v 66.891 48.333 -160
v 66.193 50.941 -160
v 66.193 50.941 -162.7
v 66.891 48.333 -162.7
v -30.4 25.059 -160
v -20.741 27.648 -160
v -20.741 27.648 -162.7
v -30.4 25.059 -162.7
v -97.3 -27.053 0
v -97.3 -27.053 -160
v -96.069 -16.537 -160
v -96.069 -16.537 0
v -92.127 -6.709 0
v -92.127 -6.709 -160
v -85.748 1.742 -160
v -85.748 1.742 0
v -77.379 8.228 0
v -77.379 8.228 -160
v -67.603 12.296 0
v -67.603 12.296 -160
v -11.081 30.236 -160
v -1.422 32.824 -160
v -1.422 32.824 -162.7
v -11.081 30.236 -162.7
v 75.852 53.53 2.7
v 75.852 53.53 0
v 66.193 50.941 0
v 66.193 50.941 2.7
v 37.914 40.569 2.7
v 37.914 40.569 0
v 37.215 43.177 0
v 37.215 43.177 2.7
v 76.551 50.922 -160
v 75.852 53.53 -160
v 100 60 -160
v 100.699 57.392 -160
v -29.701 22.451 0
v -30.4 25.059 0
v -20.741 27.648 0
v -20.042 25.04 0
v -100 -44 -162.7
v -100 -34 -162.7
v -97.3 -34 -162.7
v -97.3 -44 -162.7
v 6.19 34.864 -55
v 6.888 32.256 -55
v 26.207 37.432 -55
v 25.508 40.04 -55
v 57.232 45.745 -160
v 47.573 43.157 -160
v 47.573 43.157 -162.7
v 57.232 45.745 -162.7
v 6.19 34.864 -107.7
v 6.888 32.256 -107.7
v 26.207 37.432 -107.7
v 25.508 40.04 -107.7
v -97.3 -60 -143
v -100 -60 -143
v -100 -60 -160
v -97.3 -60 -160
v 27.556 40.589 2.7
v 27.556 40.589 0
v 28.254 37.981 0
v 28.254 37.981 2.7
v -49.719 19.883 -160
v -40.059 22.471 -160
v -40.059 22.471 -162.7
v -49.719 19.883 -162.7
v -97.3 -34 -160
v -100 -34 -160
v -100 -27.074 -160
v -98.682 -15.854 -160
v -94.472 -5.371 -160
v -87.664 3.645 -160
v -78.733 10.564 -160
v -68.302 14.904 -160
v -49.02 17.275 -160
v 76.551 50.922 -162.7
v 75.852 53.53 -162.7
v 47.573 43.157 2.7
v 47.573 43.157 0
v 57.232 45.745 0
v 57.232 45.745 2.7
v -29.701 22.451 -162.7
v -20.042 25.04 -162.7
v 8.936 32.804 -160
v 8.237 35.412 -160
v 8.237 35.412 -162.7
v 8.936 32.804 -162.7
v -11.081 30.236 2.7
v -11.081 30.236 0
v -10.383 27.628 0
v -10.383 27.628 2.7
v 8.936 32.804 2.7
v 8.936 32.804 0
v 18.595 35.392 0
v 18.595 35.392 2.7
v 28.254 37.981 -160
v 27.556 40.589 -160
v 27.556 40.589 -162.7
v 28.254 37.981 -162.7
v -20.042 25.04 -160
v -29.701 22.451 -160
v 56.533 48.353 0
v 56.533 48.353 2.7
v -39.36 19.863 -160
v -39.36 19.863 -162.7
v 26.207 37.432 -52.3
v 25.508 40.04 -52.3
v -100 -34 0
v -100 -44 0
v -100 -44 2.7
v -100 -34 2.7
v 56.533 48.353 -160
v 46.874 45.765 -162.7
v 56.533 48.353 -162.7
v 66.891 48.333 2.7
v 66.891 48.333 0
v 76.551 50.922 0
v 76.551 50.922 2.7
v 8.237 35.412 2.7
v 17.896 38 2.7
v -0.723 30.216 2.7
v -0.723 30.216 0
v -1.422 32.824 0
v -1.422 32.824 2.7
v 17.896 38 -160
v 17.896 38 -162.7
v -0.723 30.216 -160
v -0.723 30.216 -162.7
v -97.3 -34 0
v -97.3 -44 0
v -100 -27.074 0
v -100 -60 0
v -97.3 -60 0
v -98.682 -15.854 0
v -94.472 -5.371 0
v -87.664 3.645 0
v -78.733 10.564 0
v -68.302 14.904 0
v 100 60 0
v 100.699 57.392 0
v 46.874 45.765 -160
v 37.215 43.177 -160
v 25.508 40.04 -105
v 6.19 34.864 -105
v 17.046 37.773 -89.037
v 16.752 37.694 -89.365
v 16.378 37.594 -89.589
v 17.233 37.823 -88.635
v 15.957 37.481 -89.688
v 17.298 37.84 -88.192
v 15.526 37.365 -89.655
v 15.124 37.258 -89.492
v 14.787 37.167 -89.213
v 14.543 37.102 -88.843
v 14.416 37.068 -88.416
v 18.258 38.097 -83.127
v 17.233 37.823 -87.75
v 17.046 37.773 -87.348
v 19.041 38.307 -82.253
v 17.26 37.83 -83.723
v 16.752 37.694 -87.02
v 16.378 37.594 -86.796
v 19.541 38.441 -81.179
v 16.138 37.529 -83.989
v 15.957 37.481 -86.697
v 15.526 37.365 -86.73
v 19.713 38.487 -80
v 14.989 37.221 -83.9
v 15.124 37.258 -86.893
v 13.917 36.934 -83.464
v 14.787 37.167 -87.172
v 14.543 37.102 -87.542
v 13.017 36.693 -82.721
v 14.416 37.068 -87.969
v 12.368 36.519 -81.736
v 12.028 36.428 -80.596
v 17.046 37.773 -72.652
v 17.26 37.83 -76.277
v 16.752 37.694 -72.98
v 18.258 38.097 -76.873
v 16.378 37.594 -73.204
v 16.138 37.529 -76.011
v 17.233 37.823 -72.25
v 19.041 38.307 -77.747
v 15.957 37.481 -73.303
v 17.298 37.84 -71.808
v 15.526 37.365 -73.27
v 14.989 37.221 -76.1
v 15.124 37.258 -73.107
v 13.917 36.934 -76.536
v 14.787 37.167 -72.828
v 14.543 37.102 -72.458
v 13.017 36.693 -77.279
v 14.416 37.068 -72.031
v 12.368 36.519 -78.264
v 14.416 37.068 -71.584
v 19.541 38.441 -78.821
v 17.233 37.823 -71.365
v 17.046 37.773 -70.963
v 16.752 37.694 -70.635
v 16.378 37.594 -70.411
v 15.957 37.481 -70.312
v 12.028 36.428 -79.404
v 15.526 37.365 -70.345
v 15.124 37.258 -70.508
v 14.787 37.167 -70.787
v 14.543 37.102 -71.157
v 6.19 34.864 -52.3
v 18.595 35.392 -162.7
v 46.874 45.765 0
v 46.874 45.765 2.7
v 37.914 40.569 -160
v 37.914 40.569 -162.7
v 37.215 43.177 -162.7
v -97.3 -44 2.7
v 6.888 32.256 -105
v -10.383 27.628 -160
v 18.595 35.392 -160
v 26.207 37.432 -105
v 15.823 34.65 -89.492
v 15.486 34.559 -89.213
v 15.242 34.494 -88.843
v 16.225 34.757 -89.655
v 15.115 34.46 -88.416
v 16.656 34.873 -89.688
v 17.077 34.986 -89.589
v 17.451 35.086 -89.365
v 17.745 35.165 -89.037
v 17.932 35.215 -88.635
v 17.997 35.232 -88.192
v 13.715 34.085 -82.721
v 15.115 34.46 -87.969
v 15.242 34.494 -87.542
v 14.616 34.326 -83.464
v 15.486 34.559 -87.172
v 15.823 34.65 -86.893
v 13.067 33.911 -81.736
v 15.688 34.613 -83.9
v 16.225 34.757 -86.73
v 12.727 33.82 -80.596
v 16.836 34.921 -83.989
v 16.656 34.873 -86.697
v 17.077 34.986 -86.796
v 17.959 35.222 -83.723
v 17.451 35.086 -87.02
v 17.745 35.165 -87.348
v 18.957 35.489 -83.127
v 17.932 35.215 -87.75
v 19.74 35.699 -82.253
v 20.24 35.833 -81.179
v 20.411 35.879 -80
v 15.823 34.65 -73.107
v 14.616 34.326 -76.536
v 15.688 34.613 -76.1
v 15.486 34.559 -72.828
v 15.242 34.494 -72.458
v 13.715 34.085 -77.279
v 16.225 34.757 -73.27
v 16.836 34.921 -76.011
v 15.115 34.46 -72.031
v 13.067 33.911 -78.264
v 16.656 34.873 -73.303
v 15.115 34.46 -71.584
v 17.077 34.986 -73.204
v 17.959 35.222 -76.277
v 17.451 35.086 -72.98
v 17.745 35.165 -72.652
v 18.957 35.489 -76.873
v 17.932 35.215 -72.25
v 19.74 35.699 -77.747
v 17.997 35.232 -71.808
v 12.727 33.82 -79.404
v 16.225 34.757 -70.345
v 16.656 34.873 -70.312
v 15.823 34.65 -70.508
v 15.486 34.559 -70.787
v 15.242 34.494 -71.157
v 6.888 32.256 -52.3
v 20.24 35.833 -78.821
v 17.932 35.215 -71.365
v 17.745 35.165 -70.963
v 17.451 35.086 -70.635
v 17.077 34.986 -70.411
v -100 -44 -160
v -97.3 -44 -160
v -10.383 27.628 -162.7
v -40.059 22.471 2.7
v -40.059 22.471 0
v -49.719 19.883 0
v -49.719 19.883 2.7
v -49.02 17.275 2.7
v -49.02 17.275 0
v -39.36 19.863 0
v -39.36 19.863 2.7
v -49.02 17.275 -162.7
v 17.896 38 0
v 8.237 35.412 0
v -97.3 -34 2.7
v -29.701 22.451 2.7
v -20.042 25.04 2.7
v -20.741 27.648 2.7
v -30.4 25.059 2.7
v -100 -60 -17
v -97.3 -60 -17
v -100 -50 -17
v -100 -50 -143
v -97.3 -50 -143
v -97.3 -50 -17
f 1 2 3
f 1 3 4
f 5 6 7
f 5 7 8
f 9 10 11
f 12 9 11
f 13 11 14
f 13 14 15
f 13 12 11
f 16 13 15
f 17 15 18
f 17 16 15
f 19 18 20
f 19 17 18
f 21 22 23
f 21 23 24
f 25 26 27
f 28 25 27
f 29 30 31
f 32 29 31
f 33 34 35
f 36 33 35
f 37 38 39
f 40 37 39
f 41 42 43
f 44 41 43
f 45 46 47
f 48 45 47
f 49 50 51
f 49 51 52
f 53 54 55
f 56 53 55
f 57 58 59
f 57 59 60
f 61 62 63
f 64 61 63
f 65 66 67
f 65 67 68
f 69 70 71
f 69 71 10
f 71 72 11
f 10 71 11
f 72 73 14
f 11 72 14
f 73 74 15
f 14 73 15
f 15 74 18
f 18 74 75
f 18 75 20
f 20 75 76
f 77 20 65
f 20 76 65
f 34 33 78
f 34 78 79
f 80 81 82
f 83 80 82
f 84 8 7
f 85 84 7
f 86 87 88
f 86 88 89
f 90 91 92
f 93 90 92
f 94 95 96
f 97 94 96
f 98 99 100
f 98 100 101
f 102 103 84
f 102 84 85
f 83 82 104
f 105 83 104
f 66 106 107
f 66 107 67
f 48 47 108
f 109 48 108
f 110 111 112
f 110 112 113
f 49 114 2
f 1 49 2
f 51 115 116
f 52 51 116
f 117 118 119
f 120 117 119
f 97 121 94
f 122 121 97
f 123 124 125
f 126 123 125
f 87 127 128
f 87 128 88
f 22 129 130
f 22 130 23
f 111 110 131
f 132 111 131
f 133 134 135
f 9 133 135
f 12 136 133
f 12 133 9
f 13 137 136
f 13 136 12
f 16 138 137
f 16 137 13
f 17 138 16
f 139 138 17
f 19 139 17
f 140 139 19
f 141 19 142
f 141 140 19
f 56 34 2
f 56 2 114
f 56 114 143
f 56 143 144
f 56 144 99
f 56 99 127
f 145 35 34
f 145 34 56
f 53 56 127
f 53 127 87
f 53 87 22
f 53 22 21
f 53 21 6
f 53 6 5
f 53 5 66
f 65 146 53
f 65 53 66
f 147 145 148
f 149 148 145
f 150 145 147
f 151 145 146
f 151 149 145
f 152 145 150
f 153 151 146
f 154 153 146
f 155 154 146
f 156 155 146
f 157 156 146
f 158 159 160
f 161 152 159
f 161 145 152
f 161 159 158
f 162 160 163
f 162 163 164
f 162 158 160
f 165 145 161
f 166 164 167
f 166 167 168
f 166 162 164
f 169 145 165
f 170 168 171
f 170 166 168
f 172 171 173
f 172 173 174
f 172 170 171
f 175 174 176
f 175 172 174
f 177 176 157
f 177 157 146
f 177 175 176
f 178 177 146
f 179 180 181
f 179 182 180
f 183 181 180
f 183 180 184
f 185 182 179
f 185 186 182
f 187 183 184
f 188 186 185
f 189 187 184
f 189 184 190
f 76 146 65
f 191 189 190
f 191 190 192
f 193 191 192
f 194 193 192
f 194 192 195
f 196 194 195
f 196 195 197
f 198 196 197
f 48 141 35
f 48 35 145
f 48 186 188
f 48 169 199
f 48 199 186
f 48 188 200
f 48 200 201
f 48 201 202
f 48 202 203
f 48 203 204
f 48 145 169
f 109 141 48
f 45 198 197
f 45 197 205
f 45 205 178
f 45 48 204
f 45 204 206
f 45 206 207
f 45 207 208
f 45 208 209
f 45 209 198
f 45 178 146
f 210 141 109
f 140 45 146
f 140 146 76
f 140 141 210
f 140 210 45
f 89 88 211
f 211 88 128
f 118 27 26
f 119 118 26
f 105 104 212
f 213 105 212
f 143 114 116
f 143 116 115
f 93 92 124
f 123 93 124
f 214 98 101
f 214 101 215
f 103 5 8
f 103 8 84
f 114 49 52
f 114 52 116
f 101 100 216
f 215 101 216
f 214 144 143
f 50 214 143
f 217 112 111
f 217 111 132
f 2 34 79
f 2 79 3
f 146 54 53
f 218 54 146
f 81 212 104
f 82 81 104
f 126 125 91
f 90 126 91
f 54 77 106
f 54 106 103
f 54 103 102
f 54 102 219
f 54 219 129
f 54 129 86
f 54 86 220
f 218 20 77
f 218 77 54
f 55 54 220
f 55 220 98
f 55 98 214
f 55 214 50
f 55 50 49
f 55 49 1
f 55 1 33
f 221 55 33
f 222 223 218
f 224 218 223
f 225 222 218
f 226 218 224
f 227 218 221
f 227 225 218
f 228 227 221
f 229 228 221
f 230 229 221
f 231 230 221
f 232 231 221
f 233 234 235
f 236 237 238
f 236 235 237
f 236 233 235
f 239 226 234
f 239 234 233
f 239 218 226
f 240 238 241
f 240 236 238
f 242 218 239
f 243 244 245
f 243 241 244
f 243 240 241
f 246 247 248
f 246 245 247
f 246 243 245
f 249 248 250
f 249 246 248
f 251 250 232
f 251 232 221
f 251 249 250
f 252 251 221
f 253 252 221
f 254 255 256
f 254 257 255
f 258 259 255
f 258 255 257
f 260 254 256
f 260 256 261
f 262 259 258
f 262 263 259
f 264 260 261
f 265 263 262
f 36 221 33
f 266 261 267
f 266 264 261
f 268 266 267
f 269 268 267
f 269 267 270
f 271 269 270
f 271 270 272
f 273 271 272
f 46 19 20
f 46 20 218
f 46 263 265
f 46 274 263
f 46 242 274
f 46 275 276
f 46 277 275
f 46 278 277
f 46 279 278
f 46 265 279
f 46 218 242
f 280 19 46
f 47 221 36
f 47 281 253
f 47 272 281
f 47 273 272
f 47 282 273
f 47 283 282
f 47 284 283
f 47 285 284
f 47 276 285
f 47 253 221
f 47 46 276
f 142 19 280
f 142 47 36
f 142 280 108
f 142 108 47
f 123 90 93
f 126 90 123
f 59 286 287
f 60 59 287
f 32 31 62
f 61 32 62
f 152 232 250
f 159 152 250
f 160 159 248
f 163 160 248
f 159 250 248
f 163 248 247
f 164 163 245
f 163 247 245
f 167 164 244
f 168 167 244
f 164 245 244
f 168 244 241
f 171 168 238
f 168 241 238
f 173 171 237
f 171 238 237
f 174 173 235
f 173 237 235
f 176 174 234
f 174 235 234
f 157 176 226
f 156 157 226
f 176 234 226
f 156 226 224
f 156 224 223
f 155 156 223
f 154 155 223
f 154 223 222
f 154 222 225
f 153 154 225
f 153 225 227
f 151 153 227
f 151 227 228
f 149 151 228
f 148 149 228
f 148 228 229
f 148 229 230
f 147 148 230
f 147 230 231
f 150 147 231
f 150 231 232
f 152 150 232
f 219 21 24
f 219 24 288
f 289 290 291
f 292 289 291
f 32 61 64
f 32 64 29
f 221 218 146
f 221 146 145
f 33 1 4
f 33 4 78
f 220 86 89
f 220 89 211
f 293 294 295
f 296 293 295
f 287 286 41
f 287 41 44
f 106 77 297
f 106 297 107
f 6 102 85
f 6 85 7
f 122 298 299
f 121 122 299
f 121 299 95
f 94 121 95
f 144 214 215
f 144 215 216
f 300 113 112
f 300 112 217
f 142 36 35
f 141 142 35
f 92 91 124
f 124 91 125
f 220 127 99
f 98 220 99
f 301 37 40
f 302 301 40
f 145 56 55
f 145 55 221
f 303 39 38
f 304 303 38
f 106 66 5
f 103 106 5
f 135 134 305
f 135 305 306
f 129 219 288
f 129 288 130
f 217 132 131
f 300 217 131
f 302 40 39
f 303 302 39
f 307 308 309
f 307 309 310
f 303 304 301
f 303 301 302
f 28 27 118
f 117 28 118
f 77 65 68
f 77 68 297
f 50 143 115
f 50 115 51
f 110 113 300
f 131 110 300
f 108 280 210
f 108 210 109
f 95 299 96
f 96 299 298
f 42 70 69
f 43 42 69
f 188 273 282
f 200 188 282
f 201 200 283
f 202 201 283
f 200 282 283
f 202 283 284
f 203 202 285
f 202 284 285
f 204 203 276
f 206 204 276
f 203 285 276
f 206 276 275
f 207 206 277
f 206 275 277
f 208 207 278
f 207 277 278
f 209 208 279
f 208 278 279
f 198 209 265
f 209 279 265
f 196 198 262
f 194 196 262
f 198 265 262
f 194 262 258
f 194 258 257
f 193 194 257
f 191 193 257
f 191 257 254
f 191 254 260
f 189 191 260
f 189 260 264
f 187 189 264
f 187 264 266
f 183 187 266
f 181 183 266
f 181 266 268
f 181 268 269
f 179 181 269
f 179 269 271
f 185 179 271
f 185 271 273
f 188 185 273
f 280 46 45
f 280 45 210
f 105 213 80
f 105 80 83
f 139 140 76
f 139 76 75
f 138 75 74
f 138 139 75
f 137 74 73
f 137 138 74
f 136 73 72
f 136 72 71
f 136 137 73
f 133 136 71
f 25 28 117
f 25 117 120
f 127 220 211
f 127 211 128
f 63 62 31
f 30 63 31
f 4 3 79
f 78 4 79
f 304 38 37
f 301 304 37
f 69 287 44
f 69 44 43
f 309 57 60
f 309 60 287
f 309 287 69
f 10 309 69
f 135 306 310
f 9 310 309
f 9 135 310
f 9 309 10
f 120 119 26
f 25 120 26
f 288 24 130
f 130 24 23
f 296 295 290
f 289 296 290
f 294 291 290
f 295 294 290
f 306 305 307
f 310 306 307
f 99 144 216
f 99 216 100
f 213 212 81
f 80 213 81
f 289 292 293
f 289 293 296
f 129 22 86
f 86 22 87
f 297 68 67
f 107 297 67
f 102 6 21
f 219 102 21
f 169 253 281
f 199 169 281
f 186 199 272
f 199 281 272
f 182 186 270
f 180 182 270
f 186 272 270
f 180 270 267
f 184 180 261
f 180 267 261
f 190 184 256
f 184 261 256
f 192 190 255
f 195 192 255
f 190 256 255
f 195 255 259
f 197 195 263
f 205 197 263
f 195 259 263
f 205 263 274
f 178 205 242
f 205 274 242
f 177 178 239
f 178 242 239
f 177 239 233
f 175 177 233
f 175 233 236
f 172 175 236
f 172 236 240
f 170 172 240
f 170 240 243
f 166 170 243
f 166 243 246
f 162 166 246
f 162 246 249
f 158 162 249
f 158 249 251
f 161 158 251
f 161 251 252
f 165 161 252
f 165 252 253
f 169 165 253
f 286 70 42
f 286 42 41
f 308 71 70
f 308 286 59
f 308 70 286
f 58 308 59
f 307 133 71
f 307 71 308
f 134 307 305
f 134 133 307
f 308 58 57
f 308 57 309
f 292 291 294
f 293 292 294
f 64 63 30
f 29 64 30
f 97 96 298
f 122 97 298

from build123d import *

# Parameters (mm, degrees)
EXTRUDE_THIN1_DEPTH   = 160
SKETCH2_W             = 2.7
SKETCH2_H             = 10
BOSS_EXTRUDE1_DEPTH   = 2.7
BOSS_EXTRUDE1_2_DEPTH = 2.7
BOSS_EXTRUDE1_3_DEPTH = 2.7
BOSS_EXTRUDE1_4_DEPTH = 2.7
BOSS_EXTRUDE1_5_DEPTH = 2.7
BOSS_EXTRUDE1_6_DEPTH = 2.7
BOSS_EXTRUDE1_7_DEPTH = 2.7
BOSS_EXTRUDE1_8_DEPTH = 2.7
SKETCH3_R             = 4
SKETCH3_R_2           = 1.5
SKETCH3_W             = 20
SKETCH3_H             = 2.7
CUT_EXTRUDE1_DEPTH    = 3
SKETCH4_W             = 126
SKETCH4_H             = 10
CUT_EXTRUDE2_DEPTH    = 3


with BuildPart() as part:
    # Sketch1 → Extrude-Thin1 (new body)
    with BuildSketch(Plane.XY):
        with BuildLine():
            Line((100, 60), (-68.302221487, 14.903555668))
            ThreePointArc((-68.302221487, 14.903555668), (-91.366544651, -0.636913735), (-100, -27.074247963))
            Line((-100, -27.074247963), (-100, -60))
            Line((-100, -60), (-97.3, -60))
            Line((-97.3, -60), (-97.3, -27.053019321))
            ThreePointArc((-97.3, -27.053019321), (-89.218029242, -2.272148948), (-67.603410065, 12.295555937))
            Line((-67.603410065, 12.295555937), (100.698811422, 57.392000269))
            Line((100.698811422, 57.392000269), (100, 60))
        make_face()
    extrude(amount=-EXTRUDE_THIN1_DEPTH)


with BuildPart() as body_2:
    # Sketch2 → Boss-Extrude1 (new body)
    with BuildSketch(Plane.XY):
        with Locations((-98.65, -39)):
            Rectangle(SKETCH2_W, SKETCH2_H)
    boss_extrude1 = extrude(amount=BOSS_EXTRUDE1_DEPTH)


with BuildPart() as body_3:
    # Sketch2 → Boss-Extrude1 2 (new body)
    with BuildSketch(Plane.XY):
        Polygon((-40.059244812, 22.47123846), (-49.718503075, 19.883048009), (-49.019691653, 17.275048278), (-39.36043339, 19.863238729), align=None)
    boss_extrude1_2 = extrude(amount=BOSS_EXTRUDE1_2_DEPTH)


with BuildPart() as body_4:
    # Sketch2 → Boss-Extrude1 3 (new body)
    with BuildSketch(Plane.XY):
        Polygon((-20.740728286, 27.647619362), (-30.399986549, 25.059428911), (-29.701175127, 22.45142918), (-20.041916864, 25.039619631), align=None)
    boss_extrude1_3 = extrude(amount=BOSS_EXTRUDE1_3_DEPTH)


with BuildPart() as body_5:
    # Sketch2 → Boss-Extrude1 4 (new body)
    with BuildSketch(Plane.XY):
        Polygon((-1.42221176, 32.824000264), (-11.081470023, 30.235809813), (-10.382658601, 27.627810082), (-0.723400339, 30.216000533), align=None)
    boss_extrude1_4 = extrude(amount=BOSS_EXTRUDE1_4_DEPTH)


with BuildPart() as body_6:
    # Sketch2 → Boss-Extrude1 5 (new body)
    with BuildSketch(Plane.XY):
        Polygon((17.896304765, 38.000381166), (8.237046503, 35.412190715), (8.935857924, 32.804190984), (18.595116187, 35.392381435), align=None)
    boss_extrude1_5 = extrude(amount=BOSS_EXTRUDE1_5_DEPTH)


with BuildPart() as body_7:
    # Sketch2 → Boss-Extrude1 6 (new body)
    with BuildSketch(Plane.XY):
        Polygon((37.214821291, 43.176762068), (27.555563028, 40.588571617), (28.25437445, 37.980571886), (37.913632713, 40.568762337), align=None)
    boss_extrude1_6 = extrude(amount=BOSS_EXTRUDE1_6_DEPTH)


with BuildPart() as body_8:
    # Sketch2 → Boss-Extrude1 7 (new body)
    with BuildSketch(Plane.XY):
        Polygon((56.533337817, 48.35314297), (46.874079554, 45.764952519), (47.572890976, 43.156952788), (57.232149239, 45.745143239), align=None)
    boss_extrude1_7 = extrude(amount=BOSS_EXTRUDE1_7_DEPTH)


with BuildPart() as body_9:
    # Sketch2 → Boss-Extrude1 8 (new body)
    with BuildSketch(Plane.XY):
        Polygon((75.851854343, 53.529523872), (66.19259608, 50.941333421), (66.891407502, 48.33333369), (76.550665765, 50.921524141), align=None)
    boss_extrude1_8 = extrude(amount=BOSS_EXTRUDE1_8_DEPTH)


with BuildPart() as part_1:
    add(part.part)

    # Mirror1: Boss-Extrude1, Boss-Extrude1 2, Boss-Extrude1 3, Boss-Extrude1 4, Boss-Extrude1 5, Boss-Extrude1 6, Boss-Extrude1 7, Boss-Extrude1 8 across plane
    add(boss_extrude1.mirror(Plane.XY.offset(-80)))
    add(boss_extrude1_2.mirror(Plane.XY.offset(-80)))
    add(boss_extrude1_3.mirror(Plane.XY.offset(-80)))
    add(boss_extrude1_4.mirror(Plane.XY.offset(-80)))
    add(boss_extrude1_5.mirror(Plane.XY.offset(-80)))
    add(boss_extrude1_6.mirror(Plane.XY.offset(-80)))
    add(boss_extrude1_7.mirror(Plane.XY.offset(-80)))
    add(boss_extrude1_8.mirror(Plane.XY.offset(-80)))

    # Sketch3 → Cut-Extrude1 (cut)
    with BuildSketch(Plane(origin=(-7.602458767, 28.372762383, 0), x_dir=(0.965925826, 0.258819045, 0), z_dir=(0.258819045, -0.965925826, 0))):
        with Locations((25.002084828, -80)):
            Circle(SKETCH3_R)
        with Locations((25.002084828, -71.8075)):
            Circle(SKETCH3_R_2)
        with Locations((25.002084828, -88.1925)):
            Circle(SKETCH3_R_2)
        with Locations((25.002084828, -106.35)):
            Rectangle(SKETCH3_W, SKETCH3_H)
        with Locations((25.002084828, -53.65)):
            Rectangle(SKETCH3_W, SKETCH3_H)
    extrude(amount=-CUT_EXTRUDE1_DEPTH, mode=Mode.SUBTRACT)

    # Sketch4 → Cut-Extrude2 (cut)
    with BuildSketch(Plane.ZY.offset(100)):
        with Locations((-80, -55)):
            Rectangle(SKETCH4_W, SKETCH4_H)
    extrude(amount=-CUT_EXTRUDE2_DEPTH, mode=Mode.SUBTRACT)


solid = Compound([body_2.part, body_3.part, body_4.part, body_5.part, body_6.part, body_7.part, body_8.part, body_9.part, part_1.part])
